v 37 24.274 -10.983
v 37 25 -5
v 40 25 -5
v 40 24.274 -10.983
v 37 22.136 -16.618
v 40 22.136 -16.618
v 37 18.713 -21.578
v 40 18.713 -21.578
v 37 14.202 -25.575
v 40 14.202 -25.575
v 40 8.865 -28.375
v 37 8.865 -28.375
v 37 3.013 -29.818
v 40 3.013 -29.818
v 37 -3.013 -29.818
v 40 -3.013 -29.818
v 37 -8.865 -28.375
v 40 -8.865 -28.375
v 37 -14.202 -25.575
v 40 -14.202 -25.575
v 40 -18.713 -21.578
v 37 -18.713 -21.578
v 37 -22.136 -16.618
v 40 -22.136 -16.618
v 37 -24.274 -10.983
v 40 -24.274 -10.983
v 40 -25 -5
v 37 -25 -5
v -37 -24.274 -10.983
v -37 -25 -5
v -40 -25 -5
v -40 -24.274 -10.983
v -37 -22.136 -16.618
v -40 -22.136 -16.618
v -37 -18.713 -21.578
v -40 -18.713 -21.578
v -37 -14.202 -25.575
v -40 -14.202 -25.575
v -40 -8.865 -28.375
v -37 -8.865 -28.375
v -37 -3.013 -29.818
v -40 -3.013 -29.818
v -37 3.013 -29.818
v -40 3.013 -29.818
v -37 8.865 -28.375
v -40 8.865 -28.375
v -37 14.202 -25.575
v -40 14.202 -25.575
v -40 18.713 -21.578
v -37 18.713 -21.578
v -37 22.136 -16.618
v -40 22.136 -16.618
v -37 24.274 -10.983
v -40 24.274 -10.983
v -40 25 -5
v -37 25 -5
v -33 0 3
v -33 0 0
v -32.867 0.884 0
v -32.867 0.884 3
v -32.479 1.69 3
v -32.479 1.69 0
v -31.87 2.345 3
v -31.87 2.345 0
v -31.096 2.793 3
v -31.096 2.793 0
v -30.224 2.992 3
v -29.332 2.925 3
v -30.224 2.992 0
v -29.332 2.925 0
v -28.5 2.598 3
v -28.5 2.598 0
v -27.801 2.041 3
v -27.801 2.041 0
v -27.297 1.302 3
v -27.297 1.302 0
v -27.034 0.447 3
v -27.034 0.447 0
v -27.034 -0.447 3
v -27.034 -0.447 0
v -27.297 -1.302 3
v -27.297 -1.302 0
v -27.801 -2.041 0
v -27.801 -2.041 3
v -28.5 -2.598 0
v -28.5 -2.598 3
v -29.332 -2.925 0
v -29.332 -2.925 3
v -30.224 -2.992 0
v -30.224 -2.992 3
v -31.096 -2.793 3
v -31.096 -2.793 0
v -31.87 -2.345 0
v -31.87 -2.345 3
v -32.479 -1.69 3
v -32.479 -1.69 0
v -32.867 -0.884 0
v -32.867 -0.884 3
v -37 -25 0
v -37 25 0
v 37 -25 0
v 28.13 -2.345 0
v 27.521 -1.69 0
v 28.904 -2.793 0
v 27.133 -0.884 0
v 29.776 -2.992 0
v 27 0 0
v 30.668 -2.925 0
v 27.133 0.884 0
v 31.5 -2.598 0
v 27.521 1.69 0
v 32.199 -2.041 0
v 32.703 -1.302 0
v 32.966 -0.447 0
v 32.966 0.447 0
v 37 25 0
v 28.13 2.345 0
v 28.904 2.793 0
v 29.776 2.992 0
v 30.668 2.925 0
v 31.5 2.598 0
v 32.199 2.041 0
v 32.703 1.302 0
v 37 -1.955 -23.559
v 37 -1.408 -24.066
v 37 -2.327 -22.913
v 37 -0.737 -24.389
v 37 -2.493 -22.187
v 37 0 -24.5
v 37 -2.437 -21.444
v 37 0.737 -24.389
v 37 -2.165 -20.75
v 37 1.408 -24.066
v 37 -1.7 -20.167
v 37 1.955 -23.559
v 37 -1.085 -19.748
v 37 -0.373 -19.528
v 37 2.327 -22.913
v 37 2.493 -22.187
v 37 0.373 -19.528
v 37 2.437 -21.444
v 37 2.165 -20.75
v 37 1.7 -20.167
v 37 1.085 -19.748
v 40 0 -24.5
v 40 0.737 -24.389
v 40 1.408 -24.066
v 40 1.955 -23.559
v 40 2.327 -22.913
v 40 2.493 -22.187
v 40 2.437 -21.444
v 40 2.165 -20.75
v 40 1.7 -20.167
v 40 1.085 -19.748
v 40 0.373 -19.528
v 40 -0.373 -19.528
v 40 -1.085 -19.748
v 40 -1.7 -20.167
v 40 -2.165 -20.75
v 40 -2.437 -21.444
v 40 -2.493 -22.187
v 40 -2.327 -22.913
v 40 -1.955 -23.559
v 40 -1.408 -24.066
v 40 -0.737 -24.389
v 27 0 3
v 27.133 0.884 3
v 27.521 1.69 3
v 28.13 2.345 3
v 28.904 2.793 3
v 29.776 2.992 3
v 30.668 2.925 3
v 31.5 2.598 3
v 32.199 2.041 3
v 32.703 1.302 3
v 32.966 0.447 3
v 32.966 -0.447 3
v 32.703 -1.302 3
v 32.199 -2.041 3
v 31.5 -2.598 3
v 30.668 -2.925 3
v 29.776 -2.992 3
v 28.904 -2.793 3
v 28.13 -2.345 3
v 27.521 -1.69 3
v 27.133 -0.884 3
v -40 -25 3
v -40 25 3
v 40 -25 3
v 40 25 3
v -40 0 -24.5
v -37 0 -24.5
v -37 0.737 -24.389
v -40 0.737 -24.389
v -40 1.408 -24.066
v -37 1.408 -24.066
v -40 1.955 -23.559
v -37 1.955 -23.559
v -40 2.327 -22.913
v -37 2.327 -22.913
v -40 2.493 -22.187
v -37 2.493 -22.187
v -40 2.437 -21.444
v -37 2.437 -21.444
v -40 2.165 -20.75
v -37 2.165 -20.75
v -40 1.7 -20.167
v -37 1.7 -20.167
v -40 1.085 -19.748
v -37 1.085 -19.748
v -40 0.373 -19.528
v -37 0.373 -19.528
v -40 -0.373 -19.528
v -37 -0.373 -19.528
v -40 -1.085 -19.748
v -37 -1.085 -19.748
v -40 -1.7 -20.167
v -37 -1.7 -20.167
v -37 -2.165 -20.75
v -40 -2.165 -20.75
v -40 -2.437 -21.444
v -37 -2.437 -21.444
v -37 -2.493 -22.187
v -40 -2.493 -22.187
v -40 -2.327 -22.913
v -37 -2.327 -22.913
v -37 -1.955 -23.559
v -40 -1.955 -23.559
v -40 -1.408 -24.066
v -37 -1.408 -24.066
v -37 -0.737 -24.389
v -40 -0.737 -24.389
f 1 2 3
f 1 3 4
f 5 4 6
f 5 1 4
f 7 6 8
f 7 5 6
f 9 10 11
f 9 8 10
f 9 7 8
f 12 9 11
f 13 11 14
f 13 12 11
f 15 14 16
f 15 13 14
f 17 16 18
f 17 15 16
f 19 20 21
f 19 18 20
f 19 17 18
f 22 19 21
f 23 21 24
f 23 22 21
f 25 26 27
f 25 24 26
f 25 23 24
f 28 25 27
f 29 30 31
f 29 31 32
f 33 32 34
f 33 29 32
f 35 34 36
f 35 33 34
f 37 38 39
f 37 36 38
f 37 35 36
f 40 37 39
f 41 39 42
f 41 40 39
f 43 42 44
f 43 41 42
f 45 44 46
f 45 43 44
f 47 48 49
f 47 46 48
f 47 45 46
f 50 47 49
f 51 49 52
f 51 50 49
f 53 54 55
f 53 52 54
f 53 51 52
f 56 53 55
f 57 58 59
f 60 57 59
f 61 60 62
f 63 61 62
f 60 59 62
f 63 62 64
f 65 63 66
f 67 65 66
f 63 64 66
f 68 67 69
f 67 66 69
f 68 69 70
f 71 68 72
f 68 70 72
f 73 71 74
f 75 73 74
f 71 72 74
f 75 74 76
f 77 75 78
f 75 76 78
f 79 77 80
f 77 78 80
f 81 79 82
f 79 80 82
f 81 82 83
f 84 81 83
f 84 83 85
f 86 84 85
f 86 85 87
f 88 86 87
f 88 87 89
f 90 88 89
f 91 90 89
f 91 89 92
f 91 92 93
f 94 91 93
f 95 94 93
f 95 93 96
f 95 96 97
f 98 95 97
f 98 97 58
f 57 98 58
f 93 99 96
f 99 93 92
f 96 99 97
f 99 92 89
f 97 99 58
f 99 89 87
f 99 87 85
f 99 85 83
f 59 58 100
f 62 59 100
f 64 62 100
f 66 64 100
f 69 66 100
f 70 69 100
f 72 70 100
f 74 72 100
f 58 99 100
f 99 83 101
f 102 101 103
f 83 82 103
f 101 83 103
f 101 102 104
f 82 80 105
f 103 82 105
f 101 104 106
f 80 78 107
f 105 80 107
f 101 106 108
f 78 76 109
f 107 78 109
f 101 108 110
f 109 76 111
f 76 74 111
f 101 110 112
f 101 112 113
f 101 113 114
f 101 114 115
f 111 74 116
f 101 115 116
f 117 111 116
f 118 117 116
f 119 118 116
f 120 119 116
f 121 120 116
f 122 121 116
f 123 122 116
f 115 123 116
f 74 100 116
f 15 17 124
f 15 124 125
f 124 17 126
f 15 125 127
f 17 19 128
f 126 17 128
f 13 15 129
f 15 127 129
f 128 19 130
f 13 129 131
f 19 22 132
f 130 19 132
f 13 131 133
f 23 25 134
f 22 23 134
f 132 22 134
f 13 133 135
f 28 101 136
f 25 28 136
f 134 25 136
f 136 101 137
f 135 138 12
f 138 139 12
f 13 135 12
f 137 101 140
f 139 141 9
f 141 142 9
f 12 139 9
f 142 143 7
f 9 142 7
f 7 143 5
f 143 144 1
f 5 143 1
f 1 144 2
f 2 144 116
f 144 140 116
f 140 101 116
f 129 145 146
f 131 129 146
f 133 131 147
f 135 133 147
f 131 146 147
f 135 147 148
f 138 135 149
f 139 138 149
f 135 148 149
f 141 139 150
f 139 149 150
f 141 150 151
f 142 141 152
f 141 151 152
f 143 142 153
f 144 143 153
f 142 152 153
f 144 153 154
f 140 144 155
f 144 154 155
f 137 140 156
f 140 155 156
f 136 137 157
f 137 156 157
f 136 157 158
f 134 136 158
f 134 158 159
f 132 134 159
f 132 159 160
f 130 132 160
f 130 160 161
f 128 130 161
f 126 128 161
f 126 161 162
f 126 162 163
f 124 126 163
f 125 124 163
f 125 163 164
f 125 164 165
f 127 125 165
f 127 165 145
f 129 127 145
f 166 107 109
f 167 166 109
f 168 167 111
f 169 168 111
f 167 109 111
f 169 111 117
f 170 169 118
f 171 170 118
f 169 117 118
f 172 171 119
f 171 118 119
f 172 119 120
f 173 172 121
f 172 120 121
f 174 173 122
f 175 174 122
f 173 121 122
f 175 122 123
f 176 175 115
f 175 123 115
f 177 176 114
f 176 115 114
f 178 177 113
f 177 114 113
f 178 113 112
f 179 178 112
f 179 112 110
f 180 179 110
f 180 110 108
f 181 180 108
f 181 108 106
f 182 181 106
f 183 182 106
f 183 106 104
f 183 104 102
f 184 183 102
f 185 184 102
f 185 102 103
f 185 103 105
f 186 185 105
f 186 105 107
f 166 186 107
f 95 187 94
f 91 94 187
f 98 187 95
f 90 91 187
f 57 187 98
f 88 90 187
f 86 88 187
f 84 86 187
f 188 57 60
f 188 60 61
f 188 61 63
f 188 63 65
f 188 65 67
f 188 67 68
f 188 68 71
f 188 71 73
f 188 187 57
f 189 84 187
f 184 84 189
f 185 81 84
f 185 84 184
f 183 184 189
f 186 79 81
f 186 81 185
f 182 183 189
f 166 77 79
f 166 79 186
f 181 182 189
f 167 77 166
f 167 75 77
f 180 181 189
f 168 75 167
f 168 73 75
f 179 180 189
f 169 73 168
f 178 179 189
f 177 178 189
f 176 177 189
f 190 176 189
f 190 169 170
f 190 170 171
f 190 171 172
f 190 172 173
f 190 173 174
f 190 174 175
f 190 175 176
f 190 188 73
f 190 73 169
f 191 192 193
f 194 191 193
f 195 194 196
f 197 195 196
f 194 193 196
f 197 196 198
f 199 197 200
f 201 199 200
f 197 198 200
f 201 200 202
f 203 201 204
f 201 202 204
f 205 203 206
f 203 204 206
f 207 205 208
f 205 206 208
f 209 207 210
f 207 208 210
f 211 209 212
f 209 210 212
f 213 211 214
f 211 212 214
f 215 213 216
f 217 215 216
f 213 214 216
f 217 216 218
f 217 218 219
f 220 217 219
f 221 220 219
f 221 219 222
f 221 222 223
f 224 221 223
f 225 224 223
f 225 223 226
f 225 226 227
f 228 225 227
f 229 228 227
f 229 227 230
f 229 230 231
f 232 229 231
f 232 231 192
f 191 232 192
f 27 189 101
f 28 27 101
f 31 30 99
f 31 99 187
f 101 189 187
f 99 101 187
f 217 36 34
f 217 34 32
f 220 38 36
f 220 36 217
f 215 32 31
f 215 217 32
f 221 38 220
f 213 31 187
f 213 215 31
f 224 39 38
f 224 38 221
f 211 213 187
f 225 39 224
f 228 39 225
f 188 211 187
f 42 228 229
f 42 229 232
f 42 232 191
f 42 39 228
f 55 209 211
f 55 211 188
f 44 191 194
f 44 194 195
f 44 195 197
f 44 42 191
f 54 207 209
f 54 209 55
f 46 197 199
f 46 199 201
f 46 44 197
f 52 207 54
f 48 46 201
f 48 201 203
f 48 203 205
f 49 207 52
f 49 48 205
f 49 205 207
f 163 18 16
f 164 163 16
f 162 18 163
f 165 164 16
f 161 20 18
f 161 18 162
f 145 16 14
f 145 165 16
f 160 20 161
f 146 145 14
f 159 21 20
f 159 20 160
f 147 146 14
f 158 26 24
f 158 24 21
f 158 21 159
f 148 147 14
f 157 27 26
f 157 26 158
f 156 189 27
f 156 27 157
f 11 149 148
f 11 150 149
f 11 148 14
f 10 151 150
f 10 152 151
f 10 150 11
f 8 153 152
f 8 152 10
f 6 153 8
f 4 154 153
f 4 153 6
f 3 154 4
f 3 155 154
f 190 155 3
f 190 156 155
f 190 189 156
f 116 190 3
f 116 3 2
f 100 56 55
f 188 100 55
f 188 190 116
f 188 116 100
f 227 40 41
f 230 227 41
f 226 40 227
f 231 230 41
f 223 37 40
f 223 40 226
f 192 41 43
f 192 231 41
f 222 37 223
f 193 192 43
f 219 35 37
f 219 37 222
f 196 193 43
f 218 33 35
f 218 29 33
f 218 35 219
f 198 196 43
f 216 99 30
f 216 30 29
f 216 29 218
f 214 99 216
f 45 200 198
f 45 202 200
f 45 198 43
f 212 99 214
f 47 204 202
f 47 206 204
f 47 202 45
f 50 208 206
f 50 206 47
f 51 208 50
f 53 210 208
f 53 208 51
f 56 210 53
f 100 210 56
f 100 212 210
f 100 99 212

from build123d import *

# Parameters (mm, degrees)
SKETCH1_W           = 80
SKETCH1_H           = 50
BOSS_EXTRUDE1_DEPTH = 3
CUT_EXTRUDE1_REACH  = 49.265
SKETCH2_R           = 3
SKETCH3_W           = 3
SKETCH3_H           = 50
BOSS_EXTRUDE2_DEPTH = 30
FILLET1_RADIUS      = 25
FILLET1_LENGTH      = 3
FILLET2_RADIUS      = 25
FILLET2_LENGTH      = 3
SKETCH4_R           = 2.5
CUT_EXTRUDE2_DEPTH  = 200


with BuildPart() as part:
    # Sketch1 → Boss-Extrude1 (new body)
    with BuildSketch(Plane.XY):
        Rectangle(SKETCH1_W, SKETCH1_H)
    extrude(amount=BOSS_EXTRUDE1_DEPTH)

    # Sketch2 → Cut-Extrude1 (cut, up to next)
    with BuildSketch(Plane(origin=(0, 0, 0), x_dir=(-1, 0, 0), z_dir=(0, 0, -1)), mode=Mode.PRIVATE) as cut_extrude1_sk1:
        with Locations((-30, 0)):
            Circle(SKETCH2_R)
    cut_extrude1_tool1 = extrude(cut_extrude1_sk1.sketch, amount=-CUT_EXTRUDE1_REACH, mode=Mode.PRIVATE) & part.part
    # Sketch2 → Cut-Extrude1 (cut, up to next)
    with BuildSketch(Plane(origin=(0, 0, 0), x_dir=(-1, 0, 0), z_dir=(0, 0, -1)), mode=Mode.PRIVATE) as cut_extrude1_sk2:
        with Locations((30, 0)):
            Circle(SKETCH2_R)
    cut_extrude1_tool2 = extrude(cut_extrude1_sk2.sketch, amount=-CUT_EXTRUDE1_REACH, mode=Mode.PRIVATE) & part.part
    add(cut_extrude1_tool1.solids().sort_by_distance((30, 0, 0))[0], mode=Mode.SUBTRACT)
    add(cut_extrude1_tool2.solids().sort_by_distance((-30, 0, 0))[0], mode=Mode.SUBTRACT)

    # Sketch3 → Boss-Extrude2 (add)
    with BuildSketch(Plane(origin=(0, 0, 0), x_dir=(-1, 0, 0), z_dir=(0, 0, -1))):
        with Locations((-38.5, 0)):
            Rectangle(SKETCH3_W, SKETCH3_H)
        with Locations((38.5, 0)):
            Rectangle(SKETCH3_W, SKETCH3_H)
    extrude(amount=BOSS_EXTRUDE2_DEPTH)

    # Fillet1: full round fillet: the end face becomes a half cylinder, R = half its width
    fillet1_face = Plane((38.5, 0, -30), x_dir=(-1, 0, 0), z_dir=(0, 0, -1))  # on the end face: x along it, z out of the body
    fillet1_slab = fillet1_face.offset(-FILLET1_RADIUS / 2) * Box(FILLET1_LENGTH, 2 * FILLET1_RADIUS, FILLET1_RADIUS, mode=Mode.PRIVATE)  # the body's end, R deep
    fillet1_round = Plane((38.5, 0, -5), x_dir=(0, 0, -1), z_dir=(-1, 0, 0)) * Cylinder(FILLET1_RADIUS, FILLET1_LENGTH, mode=Mode.PRIVATE)  # its axis R under the face
    add(fillet1_slab - fillet1_round, mode=Mode.SUBTRACT)

    # Fillet2: full round fillet: the end face becomes a half cylinder, R = half its width
    fillet2_face = Plane((-38.5, 0, -30), x_dir=(1, 0, 0), z_dir=(0, 0, -1))  # on the end face: x along it, z out of the body
    fillet2_slab = fillet2_face.offset(-FILLET2_RADIUS / 2) * Box(FILLET2_LENGTH, 2 * FILLET2_RADIUS, FILLET2_RADIUS, mode=Mode.PRIVATE)  # the body's end, R deep
    fillet2_round = Plane((-38.5, 0, -5), x_dir=(0, 0, -1), z_dir=(1, 0, 0)) * Cylinder(FILLET2_RADIUS, FILLET2_LENGTH, mode=Mode.PRIVATE)  # its axis R under the face
    add(fillet2_slab - fillet2_round, mode=Mode.SUBTRACT)

    # Sketch4 → Cut-Extrude2 (cut)
    with BuildSketch(Plane(origin=(40, 0, 0), x_dir=(0, 0, -1), z_dir=(1, 0, 0))):
        with Locations((22, 0)):
            Circle(SKETCH4_R)
    extrude(amount=-CUT_EXTRUDE2_DEPTH, mode=Mode.SUBTRACT)


solid = part.part
